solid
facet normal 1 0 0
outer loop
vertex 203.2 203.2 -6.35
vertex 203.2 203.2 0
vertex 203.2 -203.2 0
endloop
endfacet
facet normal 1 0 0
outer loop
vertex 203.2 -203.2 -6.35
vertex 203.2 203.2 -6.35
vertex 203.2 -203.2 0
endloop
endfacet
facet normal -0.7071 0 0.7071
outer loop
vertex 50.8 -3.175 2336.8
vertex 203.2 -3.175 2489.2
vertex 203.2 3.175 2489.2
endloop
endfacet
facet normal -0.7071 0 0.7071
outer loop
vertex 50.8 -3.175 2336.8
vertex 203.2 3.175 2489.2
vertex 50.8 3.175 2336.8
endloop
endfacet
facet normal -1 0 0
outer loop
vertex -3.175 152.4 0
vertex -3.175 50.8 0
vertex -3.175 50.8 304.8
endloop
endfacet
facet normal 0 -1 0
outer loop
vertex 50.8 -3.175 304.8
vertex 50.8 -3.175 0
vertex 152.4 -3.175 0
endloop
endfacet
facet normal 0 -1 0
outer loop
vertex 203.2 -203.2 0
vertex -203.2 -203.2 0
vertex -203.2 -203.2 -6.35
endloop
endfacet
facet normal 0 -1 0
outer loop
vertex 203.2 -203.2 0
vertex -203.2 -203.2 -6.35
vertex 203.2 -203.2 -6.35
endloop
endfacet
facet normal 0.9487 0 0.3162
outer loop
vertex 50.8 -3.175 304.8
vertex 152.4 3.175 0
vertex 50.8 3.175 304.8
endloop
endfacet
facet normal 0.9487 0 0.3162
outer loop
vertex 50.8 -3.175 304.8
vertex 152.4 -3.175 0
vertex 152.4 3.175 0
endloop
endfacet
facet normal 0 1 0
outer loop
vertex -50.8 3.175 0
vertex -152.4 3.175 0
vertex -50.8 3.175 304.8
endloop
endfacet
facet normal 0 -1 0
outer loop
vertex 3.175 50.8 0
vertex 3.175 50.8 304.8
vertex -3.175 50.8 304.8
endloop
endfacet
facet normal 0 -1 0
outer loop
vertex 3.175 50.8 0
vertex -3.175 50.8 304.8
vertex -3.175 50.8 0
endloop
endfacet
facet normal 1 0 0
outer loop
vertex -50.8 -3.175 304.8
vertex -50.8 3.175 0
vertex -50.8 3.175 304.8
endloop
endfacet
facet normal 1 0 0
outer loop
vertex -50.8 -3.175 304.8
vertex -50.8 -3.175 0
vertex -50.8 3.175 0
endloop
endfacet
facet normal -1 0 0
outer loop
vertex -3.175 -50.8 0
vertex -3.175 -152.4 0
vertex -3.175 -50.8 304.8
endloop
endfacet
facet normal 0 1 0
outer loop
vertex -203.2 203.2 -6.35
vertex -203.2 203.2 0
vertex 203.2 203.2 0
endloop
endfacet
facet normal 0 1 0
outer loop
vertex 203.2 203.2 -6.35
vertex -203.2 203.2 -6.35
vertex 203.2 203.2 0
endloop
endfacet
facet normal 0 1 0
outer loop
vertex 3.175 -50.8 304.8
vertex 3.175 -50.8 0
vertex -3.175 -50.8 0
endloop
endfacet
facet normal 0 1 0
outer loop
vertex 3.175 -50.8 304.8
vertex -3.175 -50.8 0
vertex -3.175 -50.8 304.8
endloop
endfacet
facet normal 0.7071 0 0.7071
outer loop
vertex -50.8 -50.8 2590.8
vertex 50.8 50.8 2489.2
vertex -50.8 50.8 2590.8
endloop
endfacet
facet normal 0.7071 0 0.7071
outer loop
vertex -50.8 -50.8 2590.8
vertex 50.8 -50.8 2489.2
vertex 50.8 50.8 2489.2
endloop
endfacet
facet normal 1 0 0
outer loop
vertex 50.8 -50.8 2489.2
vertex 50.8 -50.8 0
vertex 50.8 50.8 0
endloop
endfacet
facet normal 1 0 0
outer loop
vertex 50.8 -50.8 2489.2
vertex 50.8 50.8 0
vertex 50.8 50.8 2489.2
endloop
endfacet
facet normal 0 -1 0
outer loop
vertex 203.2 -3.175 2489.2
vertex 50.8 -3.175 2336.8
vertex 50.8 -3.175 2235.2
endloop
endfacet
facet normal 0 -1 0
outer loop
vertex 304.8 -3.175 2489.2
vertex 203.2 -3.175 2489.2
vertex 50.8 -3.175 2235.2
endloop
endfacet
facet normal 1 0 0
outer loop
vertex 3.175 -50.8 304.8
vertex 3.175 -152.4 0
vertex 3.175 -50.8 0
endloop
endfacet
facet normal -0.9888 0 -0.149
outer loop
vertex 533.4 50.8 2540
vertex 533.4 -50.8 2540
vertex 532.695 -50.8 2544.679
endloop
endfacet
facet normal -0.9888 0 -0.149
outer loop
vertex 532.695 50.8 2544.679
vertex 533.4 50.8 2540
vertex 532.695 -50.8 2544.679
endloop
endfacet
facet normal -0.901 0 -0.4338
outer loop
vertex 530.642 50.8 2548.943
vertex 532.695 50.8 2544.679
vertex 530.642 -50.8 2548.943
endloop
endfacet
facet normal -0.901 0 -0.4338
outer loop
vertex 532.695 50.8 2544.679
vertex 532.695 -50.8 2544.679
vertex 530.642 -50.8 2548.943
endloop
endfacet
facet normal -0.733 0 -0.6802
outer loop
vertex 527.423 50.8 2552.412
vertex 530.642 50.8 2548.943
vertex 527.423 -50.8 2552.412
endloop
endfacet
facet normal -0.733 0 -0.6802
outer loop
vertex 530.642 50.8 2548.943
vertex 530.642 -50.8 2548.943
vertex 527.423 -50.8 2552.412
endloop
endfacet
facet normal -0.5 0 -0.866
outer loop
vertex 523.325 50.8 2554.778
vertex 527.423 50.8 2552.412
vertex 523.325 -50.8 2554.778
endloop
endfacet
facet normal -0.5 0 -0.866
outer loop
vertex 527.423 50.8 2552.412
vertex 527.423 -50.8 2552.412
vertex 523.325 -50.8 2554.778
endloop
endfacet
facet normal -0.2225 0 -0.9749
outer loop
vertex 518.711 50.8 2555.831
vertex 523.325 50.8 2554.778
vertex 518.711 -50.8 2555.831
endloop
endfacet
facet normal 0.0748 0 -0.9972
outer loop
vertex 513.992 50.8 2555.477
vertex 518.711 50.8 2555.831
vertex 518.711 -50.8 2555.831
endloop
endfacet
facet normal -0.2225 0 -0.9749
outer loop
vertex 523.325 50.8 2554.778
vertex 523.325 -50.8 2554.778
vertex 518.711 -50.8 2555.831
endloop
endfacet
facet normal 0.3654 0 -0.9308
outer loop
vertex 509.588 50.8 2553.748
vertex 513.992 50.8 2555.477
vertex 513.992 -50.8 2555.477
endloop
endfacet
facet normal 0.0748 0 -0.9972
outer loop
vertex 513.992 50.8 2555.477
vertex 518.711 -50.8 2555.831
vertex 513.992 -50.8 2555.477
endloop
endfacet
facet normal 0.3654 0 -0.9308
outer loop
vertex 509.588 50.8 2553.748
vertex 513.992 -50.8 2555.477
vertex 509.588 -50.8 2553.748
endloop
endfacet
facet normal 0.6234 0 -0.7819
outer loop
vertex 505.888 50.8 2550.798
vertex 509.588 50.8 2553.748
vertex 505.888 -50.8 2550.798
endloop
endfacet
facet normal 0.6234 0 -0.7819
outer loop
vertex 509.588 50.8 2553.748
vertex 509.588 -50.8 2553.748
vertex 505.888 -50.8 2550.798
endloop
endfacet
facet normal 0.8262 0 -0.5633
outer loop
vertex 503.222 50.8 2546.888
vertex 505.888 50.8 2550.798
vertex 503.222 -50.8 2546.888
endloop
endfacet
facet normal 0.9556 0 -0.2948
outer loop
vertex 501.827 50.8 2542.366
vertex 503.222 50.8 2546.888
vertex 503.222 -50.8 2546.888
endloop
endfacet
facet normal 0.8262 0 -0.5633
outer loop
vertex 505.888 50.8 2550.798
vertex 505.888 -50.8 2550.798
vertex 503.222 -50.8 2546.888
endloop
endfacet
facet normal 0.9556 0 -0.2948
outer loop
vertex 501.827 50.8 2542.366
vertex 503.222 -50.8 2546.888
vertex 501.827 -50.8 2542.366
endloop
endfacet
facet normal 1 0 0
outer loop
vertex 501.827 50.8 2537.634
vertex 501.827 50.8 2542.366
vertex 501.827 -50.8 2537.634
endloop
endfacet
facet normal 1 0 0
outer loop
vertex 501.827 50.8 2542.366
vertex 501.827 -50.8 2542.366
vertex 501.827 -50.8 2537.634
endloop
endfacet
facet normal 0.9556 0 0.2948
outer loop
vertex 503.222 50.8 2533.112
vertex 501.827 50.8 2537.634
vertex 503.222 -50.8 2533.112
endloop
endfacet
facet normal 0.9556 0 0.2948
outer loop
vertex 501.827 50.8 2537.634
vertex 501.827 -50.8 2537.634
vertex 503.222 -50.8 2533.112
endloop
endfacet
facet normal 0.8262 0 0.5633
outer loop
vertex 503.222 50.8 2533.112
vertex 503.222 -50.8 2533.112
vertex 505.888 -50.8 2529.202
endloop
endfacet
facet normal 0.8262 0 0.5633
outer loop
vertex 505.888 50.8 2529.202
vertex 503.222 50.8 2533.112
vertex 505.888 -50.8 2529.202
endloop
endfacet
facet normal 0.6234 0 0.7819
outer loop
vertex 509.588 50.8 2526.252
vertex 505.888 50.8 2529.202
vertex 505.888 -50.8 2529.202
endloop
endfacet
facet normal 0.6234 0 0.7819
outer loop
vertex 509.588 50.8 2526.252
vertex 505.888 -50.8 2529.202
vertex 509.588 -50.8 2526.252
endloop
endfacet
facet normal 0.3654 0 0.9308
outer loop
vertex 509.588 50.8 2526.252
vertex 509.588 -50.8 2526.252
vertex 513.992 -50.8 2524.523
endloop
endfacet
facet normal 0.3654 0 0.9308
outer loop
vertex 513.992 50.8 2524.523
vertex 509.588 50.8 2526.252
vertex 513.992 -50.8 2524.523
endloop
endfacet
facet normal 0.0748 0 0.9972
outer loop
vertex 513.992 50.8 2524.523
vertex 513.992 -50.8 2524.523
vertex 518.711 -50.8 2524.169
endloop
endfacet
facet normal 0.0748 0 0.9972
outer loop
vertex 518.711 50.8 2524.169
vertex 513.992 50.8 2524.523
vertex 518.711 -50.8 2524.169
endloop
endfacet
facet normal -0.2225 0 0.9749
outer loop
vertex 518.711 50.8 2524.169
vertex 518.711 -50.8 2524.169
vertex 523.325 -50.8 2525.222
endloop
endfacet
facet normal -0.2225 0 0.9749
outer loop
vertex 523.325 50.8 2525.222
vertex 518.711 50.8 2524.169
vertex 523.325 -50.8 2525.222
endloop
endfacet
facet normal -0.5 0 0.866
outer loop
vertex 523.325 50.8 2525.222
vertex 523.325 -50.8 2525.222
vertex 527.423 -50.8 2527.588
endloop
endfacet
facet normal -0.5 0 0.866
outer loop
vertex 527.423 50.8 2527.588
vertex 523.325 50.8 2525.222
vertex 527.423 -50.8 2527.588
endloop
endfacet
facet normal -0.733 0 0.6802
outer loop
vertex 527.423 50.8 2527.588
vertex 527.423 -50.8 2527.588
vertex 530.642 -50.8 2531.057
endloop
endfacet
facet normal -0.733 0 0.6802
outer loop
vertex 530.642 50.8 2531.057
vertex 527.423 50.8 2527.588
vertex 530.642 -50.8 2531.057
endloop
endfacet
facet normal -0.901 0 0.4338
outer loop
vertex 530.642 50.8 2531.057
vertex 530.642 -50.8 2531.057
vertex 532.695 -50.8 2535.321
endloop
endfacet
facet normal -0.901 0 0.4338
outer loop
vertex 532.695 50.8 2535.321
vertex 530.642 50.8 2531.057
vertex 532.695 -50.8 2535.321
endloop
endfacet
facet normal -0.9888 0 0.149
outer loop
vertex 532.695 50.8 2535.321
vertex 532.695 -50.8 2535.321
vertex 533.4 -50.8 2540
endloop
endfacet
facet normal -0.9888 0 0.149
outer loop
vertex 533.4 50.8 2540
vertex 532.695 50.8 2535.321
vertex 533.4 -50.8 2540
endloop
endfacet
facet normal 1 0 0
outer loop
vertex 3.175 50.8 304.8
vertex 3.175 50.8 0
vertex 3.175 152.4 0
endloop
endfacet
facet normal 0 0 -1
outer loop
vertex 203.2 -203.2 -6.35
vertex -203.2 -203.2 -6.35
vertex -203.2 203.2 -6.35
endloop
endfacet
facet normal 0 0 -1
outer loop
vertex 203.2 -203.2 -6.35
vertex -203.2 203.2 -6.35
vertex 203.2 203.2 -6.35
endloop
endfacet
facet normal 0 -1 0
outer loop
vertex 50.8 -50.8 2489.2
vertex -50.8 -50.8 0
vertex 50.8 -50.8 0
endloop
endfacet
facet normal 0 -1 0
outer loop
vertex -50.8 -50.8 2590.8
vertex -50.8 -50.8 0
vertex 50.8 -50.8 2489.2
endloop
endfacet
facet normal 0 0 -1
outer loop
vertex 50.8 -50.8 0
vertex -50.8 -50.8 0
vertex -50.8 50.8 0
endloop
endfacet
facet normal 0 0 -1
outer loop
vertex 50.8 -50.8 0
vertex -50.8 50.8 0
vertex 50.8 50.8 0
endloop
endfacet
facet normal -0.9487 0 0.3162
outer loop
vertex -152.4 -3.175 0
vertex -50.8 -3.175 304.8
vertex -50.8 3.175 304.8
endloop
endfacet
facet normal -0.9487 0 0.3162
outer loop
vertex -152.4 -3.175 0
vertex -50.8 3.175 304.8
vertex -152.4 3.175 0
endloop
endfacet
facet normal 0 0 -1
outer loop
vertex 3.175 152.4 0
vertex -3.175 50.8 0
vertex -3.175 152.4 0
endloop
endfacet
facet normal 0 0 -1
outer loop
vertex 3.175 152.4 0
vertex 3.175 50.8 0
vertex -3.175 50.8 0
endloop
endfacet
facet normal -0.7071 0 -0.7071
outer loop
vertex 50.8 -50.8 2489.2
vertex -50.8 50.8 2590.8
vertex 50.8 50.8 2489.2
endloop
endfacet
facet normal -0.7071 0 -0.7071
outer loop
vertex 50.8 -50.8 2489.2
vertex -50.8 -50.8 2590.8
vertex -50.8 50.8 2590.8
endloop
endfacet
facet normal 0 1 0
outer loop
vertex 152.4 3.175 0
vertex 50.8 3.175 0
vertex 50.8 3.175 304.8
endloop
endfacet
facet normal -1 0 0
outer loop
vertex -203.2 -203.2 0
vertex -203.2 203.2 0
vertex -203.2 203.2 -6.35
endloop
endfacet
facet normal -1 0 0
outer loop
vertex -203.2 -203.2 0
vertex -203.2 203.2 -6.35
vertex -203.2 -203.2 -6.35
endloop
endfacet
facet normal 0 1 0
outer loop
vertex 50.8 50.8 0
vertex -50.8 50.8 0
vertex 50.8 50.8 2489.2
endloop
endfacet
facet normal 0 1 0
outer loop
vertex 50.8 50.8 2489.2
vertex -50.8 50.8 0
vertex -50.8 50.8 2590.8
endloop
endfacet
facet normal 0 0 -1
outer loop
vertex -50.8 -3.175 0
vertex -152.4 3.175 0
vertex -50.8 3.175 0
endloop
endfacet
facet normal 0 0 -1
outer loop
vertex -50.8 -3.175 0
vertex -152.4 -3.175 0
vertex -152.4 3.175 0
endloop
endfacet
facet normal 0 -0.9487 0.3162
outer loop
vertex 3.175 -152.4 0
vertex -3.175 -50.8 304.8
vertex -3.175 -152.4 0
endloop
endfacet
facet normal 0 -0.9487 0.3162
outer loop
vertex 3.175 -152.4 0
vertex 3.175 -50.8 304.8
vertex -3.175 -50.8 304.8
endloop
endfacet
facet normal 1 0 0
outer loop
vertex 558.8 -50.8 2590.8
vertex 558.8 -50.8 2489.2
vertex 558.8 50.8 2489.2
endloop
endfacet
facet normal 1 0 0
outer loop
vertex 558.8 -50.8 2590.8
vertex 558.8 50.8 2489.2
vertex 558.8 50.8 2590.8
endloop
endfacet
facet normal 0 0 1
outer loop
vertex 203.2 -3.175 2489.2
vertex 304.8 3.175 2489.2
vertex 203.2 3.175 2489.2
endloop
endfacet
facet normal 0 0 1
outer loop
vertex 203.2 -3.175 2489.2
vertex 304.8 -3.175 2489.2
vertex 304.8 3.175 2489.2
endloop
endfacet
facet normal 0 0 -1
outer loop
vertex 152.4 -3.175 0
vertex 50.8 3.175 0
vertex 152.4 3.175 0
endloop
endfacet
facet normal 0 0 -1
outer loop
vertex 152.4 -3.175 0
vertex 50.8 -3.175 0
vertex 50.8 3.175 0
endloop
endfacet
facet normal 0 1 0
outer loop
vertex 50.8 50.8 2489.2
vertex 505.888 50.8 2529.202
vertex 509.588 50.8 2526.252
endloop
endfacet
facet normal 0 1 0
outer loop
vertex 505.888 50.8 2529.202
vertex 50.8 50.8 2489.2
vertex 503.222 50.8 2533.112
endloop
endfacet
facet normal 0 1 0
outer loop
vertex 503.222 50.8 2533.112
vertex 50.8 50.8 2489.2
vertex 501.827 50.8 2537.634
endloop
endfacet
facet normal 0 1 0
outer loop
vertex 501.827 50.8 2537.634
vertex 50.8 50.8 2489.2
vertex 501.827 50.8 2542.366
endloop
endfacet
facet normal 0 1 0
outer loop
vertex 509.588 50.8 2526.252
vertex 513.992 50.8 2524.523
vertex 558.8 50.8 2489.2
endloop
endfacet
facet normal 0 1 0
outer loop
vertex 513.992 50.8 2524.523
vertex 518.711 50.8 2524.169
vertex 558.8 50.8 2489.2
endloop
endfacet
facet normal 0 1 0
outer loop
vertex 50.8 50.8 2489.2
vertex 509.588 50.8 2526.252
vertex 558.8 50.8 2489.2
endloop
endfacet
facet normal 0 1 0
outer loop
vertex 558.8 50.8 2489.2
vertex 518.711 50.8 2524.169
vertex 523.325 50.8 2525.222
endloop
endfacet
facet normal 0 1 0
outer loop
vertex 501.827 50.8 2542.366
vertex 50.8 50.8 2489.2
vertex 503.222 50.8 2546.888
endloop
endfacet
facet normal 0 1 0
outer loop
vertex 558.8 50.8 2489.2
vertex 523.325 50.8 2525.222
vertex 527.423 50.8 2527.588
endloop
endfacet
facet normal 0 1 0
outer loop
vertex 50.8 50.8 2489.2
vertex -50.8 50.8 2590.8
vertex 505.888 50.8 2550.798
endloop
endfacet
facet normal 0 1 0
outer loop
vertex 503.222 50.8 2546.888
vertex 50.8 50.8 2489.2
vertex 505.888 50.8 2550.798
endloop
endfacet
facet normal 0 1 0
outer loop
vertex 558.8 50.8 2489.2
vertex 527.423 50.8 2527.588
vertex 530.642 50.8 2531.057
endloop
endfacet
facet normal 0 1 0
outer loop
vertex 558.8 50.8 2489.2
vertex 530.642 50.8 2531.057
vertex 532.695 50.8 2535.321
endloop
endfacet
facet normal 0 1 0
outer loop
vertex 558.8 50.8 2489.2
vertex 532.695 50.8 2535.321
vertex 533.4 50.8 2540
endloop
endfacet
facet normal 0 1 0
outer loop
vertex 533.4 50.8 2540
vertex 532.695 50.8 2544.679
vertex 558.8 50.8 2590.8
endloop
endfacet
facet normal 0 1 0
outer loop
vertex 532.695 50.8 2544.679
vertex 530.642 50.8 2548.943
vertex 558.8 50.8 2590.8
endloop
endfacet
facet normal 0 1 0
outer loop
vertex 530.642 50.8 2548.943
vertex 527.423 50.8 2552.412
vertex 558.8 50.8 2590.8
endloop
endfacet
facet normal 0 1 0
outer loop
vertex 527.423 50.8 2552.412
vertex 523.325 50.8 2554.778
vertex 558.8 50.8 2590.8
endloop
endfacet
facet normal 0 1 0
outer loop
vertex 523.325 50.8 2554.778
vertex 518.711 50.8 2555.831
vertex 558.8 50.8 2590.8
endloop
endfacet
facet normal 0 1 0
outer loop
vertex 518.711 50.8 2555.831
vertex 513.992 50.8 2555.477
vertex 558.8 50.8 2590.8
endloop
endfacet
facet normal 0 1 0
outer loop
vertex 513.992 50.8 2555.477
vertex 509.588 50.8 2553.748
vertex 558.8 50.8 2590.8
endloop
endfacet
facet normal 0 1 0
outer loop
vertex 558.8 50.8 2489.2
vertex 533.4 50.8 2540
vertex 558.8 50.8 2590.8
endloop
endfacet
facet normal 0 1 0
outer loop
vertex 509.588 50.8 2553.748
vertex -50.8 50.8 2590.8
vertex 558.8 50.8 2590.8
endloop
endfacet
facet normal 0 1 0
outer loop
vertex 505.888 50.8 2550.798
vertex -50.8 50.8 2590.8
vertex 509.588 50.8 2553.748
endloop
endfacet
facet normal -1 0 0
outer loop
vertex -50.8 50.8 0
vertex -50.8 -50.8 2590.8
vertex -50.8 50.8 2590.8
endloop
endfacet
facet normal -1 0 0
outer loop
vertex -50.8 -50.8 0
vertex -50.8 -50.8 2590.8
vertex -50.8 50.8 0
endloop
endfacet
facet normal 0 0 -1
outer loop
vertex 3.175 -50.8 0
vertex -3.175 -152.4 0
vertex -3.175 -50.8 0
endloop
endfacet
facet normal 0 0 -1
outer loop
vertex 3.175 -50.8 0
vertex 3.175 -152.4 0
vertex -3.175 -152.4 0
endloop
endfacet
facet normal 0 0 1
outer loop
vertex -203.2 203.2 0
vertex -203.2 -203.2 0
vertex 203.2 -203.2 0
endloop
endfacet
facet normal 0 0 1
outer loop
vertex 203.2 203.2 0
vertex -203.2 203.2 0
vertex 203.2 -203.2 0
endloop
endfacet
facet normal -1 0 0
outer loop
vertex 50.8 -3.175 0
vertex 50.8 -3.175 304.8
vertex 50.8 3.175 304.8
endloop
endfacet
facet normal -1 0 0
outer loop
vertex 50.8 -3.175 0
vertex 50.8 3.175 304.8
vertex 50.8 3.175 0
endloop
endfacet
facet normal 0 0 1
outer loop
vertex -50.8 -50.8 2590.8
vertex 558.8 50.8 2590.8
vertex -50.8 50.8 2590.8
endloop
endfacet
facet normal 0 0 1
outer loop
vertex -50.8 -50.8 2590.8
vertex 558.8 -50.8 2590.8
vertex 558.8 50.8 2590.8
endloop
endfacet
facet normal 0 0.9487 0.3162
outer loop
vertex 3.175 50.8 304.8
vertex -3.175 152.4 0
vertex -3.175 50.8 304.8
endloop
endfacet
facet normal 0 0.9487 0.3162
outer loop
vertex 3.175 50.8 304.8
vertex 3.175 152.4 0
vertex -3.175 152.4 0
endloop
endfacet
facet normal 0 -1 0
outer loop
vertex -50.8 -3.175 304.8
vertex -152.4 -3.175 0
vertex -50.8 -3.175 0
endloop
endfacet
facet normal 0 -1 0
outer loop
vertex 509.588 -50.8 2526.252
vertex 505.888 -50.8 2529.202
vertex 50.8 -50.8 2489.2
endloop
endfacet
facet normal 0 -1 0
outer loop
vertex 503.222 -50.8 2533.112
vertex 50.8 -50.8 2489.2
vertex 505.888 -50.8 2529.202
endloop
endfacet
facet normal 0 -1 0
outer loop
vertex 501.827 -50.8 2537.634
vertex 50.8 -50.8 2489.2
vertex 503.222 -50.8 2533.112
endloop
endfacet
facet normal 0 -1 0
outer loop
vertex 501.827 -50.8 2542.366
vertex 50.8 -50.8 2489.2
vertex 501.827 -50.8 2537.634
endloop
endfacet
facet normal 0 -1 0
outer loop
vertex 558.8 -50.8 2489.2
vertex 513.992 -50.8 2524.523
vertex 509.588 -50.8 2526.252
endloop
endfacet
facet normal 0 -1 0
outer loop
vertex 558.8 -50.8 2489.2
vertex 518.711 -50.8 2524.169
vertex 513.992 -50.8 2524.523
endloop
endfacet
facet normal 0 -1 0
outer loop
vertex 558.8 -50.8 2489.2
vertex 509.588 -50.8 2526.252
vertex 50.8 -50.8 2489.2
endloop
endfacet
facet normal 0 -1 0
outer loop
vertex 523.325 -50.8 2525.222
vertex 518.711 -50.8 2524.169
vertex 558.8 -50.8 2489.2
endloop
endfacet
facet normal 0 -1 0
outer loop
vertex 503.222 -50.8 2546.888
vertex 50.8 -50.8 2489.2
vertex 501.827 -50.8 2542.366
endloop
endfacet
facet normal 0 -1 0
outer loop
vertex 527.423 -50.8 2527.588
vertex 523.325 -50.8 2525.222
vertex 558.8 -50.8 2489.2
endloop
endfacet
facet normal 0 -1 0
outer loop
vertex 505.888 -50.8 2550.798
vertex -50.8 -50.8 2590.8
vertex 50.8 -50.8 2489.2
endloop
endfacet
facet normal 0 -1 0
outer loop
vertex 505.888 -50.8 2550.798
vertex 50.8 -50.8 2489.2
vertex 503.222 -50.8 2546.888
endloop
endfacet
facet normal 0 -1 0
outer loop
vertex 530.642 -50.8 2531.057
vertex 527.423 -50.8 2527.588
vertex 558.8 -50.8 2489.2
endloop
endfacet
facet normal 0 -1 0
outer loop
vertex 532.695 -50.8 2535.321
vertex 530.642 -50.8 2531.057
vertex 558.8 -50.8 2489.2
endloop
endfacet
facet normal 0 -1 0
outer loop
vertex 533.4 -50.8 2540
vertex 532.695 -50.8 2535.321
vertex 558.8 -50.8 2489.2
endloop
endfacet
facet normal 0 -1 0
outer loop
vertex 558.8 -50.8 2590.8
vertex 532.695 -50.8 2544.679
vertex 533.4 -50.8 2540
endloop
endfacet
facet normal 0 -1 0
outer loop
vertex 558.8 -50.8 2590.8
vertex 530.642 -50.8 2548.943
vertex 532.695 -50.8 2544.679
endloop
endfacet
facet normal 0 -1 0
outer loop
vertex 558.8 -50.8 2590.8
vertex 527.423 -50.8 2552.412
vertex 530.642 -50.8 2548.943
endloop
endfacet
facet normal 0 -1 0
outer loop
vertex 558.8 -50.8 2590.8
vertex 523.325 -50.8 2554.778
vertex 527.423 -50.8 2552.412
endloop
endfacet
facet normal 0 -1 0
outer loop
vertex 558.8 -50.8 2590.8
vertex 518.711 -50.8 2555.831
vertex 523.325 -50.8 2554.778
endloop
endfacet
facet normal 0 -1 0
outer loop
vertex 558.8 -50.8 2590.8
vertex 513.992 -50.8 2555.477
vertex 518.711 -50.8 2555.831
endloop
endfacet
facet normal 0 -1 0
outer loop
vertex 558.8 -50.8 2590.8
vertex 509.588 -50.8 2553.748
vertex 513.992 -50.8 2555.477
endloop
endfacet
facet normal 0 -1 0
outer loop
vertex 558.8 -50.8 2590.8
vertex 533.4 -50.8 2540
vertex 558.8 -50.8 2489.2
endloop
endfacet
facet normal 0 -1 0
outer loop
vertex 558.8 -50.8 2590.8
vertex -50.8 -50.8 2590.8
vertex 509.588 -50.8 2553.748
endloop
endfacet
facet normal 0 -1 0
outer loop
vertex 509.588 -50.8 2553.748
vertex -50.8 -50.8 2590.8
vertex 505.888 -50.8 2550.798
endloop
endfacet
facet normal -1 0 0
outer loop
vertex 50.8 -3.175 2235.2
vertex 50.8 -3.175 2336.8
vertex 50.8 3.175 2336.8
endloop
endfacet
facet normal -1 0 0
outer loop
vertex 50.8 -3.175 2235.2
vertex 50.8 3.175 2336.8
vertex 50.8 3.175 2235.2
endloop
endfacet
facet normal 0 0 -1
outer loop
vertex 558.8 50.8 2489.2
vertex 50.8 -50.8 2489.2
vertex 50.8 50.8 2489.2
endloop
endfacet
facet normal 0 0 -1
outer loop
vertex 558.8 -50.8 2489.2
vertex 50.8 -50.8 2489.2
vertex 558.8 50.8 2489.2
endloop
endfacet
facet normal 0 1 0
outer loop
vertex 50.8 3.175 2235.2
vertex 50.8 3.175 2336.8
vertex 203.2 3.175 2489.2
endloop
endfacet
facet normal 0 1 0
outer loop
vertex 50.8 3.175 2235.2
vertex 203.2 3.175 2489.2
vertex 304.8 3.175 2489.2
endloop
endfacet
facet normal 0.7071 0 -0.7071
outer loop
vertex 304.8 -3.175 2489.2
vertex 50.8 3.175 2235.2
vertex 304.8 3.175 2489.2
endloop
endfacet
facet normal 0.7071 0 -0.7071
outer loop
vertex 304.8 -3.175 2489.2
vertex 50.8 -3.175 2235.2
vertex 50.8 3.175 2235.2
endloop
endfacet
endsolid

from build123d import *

# Parameters (mm, degrees)
F1_DEPTH  = 50.8
F2_W      = 406.4
F2_H      = 406.4
F3_DEPTH  = 6.35
F6_DEPTH  = 3.175
F7_DEPTH  = 3.175
F8_DEPTH  = 50.8
F10_DEPTH = 50.8
F12_DEPTH = 3.175
F13_R     = 15.875
F14_DEPTH = 127


with BuildPart() as f1:
    # F0 (on Front) → F1 (new body, symmetric)
    with BuildSketch(Plane.XZ):
        Polygon((-50.8, 2590.8), (-50.8, 0), (50.8, 0), (50.8, 2489.2), align=None)
    extrude(amount=F1_DEPTH, both=True)

    # F0 (on Front) → F8 (cut, symmetric)
    with BuildSketch(Plane.XZ):
        Polygon((50.8, 2590.8), (-50.8, 2590.8), (50.8, 2489.2), align=None)
    extrude(amount=F8_DEPTH, both=True, mode=Mode.SUBTRACT)


with BuildPart() as f3:
    # F2 (on face) → F3 (new body)
    with BuildSketch(Plane(origin=(0, 0, 0), x_dir=(1, 0, 0), z_dir=(0, 0, -1))):
        Rectangle(F2_W, F2_H)
    extrude(amount=F3_DEPTH)


with BuildPart() as f6:
    # F5 (on Right) → F6 (new body, symmetric)
    with BuildSketch(Plane.YZ):
        Polygon((152.4, 0), (50.8, 304.8), (50.8, 0), align=None)
    extrude(amount=F6_DEPTH, both=True)


with BuildPart() as f6b:
    # F5 (on Right) → F6, piece 2 (new body, symmetric)
    with BuildSketch(Plane.YZ):
        Polygon((-152.4, 0), (-50.8, 0), (-50.8, 304.8), align=None)
    extrude(amount=F6_DEPTH, both=True)


with BuildPart() as f7:
    # F4 (on Front) → F7 (new body, symmetric)
    with BuildSketch(Plane.XZ):
        Polygon((152.4, 0), (50.8, 304.8), (50.8, 0), align=None)
    extrude(amount=F7_DEPTH, both=True)


with BuildPart() as f7b:
    # F4 (on Front) → F7, piece 2 (new body, symmetric)
    with BuildSketch(Plane.XZ):
        Polygon((-50.8, 0), (-50.8, 304.8), (-152.4, 0), align=None)
    extrude(amount=F7_DEPTH, both=True)


with BuildPart() as f10:
    # F9 (on Front) → F10 (new body, symmetric)
    with BuildSketch(Plane.XZ):
        Polygon((-50.8, 2590.8), (50.8, 2489.2), (558.8, 2489.2), (558.8, 2590.8), align=None)
    extrude(amount=F10_DEPTH, both=True)

    # F13 (on face) → F14 (cut)
    with BuildSketch(Plane.XZ.offset(50.8)):
        with Locations((517.525, 2540)):
            Circle(F13_R)
    extrude(amount=-F14_DEPTH, mode=Mode.SUBTRACT)


with BuildPart() as f12:
    # F11 (on Front) → F12 (new body, symmetric)
    with BuildSketch(Plane.XZ):
        Polygon((304.8, 2489.2), (203.2, 2489.2), (50.8, 2336.8), (50.8, 2235.2), align=None)
    extrude(amount=F12_DEPTH, both=True)


solid = Compound([f1.part, f3.part, f6.part, f6b.part, f7.part, f7b.part, f10.part, f12.part])
